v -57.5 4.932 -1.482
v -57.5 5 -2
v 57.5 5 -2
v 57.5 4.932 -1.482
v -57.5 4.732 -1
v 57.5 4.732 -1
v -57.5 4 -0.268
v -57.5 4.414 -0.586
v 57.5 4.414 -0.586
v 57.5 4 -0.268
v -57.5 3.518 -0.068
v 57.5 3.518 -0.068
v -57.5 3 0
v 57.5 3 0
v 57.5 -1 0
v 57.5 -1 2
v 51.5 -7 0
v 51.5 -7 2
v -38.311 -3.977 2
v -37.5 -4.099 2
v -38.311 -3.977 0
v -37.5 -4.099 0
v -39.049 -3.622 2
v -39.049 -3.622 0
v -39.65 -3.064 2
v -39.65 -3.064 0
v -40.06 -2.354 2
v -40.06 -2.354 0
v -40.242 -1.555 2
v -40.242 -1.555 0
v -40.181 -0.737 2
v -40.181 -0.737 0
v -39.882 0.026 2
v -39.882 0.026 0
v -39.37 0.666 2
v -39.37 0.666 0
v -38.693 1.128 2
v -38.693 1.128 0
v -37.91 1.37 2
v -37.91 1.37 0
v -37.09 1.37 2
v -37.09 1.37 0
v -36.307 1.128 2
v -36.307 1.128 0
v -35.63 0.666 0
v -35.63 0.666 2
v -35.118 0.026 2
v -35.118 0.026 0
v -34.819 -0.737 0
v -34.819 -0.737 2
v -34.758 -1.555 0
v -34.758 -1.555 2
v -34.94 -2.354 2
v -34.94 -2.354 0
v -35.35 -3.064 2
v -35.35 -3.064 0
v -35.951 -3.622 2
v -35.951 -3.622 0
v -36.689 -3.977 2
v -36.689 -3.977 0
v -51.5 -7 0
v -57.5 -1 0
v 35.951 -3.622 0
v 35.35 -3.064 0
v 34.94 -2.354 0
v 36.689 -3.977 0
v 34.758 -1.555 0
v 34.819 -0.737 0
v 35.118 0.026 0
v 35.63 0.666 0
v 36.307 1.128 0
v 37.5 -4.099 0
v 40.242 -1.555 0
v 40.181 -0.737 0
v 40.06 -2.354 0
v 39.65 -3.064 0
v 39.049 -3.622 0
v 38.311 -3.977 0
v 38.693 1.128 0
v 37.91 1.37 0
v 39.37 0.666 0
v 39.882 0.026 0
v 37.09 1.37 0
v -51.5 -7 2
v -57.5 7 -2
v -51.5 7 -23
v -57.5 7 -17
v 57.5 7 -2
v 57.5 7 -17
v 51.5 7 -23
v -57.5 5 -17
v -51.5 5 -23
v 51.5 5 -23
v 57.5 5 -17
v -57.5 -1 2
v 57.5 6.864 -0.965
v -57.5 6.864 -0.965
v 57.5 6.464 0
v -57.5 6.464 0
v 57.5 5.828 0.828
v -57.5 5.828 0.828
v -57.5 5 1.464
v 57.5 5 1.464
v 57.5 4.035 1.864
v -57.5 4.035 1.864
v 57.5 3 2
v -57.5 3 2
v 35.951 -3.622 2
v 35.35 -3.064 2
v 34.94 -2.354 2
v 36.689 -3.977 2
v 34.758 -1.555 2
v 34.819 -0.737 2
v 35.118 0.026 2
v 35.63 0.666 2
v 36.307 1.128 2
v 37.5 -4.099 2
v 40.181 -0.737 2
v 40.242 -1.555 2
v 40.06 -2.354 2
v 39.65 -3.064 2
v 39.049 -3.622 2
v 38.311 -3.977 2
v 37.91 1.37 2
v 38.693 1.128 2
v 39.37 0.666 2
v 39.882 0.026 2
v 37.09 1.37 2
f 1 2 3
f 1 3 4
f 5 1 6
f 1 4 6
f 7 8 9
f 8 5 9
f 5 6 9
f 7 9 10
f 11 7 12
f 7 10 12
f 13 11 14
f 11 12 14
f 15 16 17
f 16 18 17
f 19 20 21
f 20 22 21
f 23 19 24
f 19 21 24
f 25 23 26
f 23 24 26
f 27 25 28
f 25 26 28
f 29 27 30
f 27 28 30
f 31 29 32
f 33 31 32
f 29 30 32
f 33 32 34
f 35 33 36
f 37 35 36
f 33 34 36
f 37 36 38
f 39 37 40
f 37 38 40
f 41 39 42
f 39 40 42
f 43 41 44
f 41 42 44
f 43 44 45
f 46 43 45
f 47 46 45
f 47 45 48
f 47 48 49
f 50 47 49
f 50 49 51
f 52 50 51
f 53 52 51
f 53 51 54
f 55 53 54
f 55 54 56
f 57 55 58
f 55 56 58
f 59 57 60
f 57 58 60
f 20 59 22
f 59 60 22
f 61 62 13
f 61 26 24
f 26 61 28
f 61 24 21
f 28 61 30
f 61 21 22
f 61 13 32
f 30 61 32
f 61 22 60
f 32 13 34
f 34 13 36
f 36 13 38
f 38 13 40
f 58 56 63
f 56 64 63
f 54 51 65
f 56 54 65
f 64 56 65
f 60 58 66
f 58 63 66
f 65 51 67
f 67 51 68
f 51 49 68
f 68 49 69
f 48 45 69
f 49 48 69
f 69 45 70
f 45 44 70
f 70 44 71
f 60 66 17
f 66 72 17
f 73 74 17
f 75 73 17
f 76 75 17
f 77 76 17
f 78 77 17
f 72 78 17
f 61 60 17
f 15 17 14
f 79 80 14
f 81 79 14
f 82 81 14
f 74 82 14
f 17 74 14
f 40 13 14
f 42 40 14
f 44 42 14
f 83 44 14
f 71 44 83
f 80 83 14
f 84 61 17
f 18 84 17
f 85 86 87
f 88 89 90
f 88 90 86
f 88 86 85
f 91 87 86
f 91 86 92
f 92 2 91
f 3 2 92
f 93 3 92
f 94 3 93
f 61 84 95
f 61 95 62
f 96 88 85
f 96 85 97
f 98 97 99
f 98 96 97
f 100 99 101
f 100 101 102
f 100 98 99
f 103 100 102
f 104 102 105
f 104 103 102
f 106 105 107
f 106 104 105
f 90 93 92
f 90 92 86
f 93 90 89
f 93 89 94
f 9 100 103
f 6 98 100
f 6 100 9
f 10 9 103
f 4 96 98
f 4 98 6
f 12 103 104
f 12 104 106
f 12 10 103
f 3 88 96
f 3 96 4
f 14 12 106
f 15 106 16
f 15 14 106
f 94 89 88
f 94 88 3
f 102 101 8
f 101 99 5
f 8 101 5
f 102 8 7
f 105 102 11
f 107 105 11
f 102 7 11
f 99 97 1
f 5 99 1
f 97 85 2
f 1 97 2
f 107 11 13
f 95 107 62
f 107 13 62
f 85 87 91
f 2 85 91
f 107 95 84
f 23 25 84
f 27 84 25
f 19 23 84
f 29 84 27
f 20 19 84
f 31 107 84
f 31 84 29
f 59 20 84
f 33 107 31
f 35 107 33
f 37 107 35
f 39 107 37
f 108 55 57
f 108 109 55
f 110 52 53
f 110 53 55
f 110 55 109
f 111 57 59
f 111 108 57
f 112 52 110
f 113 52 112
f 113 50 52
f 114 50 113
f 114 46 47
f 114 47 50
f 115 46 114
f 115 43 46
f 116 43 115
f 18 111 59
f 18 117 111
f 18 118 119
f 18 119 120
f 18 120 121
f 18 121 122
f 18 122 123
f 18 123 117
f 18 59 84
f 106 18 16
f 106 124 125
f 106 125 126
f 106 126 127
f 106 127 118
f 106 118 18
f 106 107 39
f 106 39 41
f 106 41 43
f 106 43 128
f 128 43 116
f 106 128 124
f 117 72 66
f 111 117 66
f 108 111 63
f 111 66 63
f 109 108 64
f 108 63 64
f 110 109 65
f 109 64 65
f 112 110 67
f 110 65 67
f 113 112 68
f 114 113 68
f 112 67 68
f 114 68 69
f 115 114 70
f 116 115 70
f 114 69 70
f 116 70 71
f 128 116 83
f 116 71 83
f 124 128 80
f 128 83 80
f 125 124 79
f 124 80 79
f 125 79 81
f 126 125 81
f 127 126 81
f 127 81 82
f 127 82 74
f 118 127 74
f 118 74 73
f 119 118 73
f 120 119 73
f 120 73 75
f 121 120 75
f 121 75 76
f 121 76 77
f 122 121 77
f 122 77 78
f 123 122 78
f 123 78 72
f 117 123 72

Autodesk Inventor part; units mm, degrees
ref_plane "YZ Plane" through (0, 0, 0) normal (1, 0, 0) x (0, 1, 0)
ref_plane "XZ Plane" through (0, 0, 0) normal (0, 1, 0) x (-1, 0, 0)
ref_plane "XY Plane" through (0, 0, 0) normal (0, 0, 1) x (1, 0, 0)
sketch "Sketch1" plane through (0, 0, 0) normal (0, 0, 1) x (1, 0, 0)
  line L0 (-57.5, -7) -> (57.5, -7)
  line L1 (57.5, -7) -> (57.5, 7)
  line L2 (57.5, 7) -> (-57.5, 7)
  line L3 (-57.5, 7) -> (-57.5, -7)
  line L4 (-57.5, -7) -> (57.5, 7) construction
  line L5 (57.5, -7) -> (-57.5, 7) construction
  point P0 (0, 0)
  dimension "d0" = 115
  dimension "d1" = 14
extrude "Plate1" add sketch "Sketch1" along normal blind 2
sketch "Sketch2" plane through (57.5, 5, 2) normal (0, 1, 0) x (-1, 0, 0)
  line L0 (115, 0) -> (0, 0)
  line L1 (0, 0) -> (0, -25)
  line L2 (0, -25) -> (115, -25)
  line L3 (115, -25) -> (115, 0)
edge flange "Flange1" height 25 angle 90 thickness 2 bend radius 2 thickness toward (0, 1, 0) relief tear relief width 2 relief depth 1 edges at (0, 7, 0) wall of the first edge with corners at (-57.5, 5, 2) (57.5, 5, 2) (57.5, 5, -23) (-57.5, 5, -23)
bend "Bend1"
corner "Corner1"
chamfer "Corner Chamfer1" distance 6 angle 45 4 edges at (-57.5, -7, 1) (57.5, -7, 1) (-57.5, 6, -23) (57.5, 6, -23)
sketch "Sketch3" plane through (0, 0, 2) normal (0, 0, 1) x (1, 0, 0)
  circle A0 centre (-37.5, -132.5) radius 2.9585 projected
  circle A1 centre (37.5, -132.5) radius 2.9585 projected
  circle A2 centre (-5, -1.3494) radius 3.1 projected
  point P0 (0, 0)
  point P1 (-37.5, -1.3494)
  point P2 (37.5, -1.3494)
hole "Hole1" at (-37.5, -1.3494, 2) at (37.5, -1.3494, 2) direction (0, 0, -1) diameter 5.5 depth 2 tip angle 118
sketch "Sketch4" plane through (0, 0, 0) normal (0, 0, -1) x (-1, 0, 0)
  point P0 (0, 0)
equation "\"d21\" = Thickness"
equation "\"d3\" = BendReliefWidth"
equation "\"d4\" = BendReliefDepth"
equation "\"d5\" = MinimumRemnant"
equation "\"d6\" = BendRadius"
equation "\"d9\" = BendRadius"
equation "\"d10\" = CornerReliefSize"
equation "\"d11\" = GapSize"
equation "\"d12\" = JacobiRadiusSize"
equation "\"BendRadius\" = Thickness"
equation "\"BendReliefWidth\" = Thickness"
equation "\"BendReliefDepth\" = 0.5 * Thickness"
equation "\"CornerReliefSize\" = 4 * Thickness"
equation "\"MinimumRemnant\" = 2 * Thickness"
equation "\"TransitionRadius\" = BendRadius"
equation "\"JacobiRadiusSize\" = BendRadius"
equation "\"GapSize\" = Thickness"
equation "\"d2\" = BendRadius"
equation "\"Thickness\" = 2"
